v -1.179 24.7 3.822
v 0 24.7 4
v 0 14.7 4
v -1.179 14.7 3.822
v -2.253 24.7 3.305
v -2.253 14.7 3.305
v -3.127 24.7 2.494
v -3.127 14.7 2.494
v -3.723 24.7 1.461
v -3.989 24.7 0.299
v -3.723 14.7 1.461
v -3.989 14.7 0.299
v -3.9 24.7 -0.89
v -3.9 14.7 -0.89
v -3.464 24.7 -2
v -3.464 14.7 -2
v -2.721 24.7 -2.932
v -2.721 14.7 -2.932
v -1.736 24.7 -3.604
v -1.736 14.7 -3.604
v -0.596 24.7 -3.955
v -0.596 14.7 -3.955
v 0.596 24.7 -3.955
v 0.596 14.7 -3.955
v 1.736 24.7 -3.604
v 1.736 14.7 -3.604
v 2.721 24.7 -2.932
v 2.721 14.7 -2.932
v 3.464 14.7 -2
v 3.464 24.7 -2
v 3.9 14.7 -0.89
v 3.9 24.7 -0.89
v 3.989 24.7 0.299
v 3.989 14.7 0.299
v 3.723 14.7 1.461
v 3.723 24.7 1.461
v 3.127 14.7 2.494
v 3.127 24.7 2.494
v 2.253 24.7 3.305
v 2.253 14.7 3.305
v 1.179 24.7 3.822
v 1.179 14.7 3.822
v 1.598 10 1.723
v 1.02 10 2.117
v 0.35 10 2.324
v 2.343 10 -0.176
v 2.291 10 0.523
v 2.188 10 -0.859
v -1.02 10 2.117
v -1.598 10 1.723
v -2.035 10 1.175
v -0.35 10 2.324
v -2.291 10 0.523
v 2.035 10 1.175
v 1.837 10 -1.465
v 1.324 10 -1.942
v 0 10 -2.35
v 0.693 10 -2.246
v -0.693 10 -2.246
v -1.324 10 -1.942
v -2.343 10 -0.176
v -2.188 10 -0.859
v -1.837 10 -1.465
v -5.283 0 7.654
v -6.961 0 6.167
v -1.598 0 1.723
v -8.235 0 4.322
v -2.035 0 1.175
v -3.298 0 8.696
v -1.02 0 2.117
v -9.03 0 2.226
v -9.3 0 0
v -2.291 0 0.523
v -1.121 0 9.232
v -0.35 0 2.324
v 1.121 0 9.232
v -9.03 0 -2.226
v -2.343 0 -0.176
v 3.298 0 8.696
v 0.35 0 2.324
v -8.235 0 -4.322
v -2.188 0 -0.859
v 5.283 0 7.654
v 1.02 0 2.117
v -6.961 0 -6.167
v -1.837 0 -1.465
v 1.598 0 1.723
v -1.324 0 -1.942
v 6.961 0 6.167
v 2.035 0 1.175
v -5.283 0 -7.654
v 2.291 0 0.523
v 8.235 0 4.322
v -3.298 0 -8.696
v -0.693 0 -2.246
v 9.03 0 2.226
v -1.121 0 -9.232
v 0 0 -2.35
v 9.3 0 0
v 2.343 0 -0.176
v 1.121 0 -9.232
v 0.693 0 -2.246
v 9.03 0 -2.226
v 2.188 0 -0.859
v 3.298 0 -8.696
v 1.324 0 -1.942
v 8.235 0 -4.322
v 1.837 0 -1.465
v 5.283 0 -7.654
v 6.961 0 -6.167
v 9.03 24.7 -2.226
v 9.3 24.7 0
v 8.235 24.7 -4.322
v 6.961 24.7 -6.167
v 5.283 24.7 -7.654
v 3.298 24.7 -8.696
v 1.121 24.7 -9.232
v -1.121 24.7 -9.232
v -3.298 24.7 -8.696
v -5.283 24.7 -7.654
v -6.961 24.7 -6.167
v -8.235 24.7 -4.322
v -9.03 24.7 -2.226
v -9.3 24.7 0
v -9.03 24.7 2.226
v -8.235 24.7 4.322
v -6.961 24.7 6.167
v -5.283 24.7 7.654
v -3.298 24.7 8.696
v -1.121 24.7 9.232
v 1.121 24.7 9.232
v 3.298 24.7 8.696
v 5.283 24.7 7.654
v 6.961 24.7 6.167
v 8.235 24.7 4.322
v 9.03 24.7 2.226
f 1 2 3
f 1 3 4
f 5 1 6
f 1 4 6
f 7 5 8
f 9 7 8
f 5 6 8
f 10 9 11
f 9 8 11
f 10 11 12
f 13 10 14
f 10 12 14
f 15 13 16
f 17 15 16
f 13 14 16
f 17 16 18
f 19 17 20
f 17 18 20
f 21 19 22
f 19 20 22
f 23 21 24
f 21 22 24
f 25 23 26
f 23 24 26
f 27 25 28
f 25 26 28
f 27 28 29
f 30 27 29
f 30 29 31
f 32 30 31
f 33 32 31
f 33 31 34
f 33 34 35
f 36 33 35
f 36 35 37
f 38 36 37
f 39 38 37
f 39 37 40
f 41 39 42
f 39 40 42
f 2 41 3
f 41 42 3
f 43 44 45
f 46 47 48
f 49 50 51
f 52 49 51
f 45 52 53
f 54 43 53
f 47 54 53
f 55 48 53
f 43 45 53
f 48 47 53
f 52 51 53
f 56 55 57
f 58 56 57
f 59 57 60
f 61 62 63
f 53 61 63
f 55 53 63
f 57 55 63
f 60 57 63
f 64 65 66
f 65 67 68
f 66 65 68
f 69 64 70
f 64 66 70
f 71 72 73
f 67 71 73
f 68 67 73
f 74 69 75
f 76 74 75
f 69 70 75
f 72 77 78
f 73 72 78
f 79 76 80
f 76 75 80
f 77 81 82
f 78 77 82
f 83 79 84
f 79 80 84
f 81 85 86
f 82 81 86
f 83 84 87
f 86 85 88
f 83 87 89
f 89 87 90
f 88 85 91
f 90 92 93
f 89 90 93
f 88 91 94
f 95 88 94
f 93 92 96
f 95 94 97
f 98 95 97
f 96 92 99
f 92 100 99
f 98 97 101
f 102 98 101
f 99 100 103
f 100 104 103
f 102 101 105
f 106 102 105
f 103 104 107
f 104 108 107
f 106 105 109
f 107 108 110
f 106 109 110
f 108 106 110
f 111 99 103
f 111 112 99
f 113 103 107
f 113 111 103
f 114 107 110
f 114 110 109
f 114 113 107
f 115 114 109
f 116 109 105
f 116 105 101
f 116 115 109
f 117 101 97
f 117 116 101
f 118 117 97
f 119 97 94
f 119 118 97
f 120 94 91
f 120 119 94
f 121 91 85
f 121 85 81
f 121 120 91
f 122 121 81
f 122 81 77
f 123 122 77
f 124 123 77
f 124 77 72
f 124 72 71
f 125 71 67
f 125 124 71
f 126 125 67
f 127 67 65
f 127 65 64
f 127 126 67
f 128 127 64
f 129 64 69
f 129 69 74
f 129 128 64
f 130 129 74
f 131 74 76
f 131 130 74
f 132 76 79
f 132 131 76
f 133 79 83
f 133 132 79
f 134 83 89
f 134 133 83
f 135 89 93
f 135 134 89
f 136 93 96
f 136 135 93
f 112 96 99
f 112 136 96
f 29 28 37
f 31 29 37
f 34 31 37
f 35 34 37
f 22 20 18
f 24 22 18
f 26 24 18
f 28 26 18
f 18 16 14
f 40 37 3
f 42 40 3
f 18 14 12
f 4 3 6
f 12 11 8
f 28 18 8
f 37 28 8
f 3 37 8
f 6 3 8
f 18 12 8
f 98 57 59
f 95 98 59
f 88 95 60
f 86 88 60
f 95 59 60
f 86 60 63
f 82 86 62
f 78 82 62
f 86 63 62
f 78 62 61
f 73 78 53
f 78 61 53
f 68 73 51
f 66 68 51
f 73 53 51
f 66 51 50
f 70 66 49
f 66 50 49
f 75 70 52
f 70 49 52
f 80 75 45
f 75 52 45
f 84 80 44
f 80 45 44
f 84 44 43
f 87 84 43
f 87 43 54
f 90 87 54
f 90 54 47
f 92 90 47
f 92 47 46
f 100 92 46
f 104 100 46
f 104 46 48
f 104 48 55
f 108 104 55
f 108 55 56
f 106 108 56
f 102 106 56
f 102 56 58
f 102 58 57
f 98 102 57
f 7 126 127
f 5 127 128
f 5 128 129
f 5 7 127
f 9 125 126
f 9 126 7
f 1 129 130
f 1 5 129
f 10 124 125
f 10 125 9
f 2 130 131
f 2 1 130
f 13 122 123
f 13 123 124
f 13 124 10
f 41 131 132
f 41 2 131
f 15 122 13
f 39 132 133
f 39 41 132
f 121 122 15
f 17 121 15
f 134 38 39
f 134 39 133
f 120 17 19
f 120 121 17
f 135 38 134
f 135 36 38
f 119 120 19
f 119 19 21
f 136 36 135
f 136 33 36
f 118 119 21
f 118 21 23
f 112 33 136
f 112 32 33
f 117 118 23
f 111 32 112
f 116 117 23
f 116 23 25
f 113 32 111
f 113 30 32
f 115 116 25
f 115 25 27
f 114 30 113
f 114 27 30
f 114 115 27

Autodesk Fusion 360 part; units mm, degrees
cylinder "CylinderPrimitive1" add diameter 18.6 height 24.7 placed x (1, 0, 0) y (0, 0, -1) z (0, 1, 0) at (0, 0, 0)
hole "Hole1" at (0, 24.7, 0) direction (0, -1, 0) diameter 8 depth 10 tip angle 180
hole "Hole2" at (0, 0, 0) direction (0, 1, 0) diameter 4.7 depth 10 tip angle 180
